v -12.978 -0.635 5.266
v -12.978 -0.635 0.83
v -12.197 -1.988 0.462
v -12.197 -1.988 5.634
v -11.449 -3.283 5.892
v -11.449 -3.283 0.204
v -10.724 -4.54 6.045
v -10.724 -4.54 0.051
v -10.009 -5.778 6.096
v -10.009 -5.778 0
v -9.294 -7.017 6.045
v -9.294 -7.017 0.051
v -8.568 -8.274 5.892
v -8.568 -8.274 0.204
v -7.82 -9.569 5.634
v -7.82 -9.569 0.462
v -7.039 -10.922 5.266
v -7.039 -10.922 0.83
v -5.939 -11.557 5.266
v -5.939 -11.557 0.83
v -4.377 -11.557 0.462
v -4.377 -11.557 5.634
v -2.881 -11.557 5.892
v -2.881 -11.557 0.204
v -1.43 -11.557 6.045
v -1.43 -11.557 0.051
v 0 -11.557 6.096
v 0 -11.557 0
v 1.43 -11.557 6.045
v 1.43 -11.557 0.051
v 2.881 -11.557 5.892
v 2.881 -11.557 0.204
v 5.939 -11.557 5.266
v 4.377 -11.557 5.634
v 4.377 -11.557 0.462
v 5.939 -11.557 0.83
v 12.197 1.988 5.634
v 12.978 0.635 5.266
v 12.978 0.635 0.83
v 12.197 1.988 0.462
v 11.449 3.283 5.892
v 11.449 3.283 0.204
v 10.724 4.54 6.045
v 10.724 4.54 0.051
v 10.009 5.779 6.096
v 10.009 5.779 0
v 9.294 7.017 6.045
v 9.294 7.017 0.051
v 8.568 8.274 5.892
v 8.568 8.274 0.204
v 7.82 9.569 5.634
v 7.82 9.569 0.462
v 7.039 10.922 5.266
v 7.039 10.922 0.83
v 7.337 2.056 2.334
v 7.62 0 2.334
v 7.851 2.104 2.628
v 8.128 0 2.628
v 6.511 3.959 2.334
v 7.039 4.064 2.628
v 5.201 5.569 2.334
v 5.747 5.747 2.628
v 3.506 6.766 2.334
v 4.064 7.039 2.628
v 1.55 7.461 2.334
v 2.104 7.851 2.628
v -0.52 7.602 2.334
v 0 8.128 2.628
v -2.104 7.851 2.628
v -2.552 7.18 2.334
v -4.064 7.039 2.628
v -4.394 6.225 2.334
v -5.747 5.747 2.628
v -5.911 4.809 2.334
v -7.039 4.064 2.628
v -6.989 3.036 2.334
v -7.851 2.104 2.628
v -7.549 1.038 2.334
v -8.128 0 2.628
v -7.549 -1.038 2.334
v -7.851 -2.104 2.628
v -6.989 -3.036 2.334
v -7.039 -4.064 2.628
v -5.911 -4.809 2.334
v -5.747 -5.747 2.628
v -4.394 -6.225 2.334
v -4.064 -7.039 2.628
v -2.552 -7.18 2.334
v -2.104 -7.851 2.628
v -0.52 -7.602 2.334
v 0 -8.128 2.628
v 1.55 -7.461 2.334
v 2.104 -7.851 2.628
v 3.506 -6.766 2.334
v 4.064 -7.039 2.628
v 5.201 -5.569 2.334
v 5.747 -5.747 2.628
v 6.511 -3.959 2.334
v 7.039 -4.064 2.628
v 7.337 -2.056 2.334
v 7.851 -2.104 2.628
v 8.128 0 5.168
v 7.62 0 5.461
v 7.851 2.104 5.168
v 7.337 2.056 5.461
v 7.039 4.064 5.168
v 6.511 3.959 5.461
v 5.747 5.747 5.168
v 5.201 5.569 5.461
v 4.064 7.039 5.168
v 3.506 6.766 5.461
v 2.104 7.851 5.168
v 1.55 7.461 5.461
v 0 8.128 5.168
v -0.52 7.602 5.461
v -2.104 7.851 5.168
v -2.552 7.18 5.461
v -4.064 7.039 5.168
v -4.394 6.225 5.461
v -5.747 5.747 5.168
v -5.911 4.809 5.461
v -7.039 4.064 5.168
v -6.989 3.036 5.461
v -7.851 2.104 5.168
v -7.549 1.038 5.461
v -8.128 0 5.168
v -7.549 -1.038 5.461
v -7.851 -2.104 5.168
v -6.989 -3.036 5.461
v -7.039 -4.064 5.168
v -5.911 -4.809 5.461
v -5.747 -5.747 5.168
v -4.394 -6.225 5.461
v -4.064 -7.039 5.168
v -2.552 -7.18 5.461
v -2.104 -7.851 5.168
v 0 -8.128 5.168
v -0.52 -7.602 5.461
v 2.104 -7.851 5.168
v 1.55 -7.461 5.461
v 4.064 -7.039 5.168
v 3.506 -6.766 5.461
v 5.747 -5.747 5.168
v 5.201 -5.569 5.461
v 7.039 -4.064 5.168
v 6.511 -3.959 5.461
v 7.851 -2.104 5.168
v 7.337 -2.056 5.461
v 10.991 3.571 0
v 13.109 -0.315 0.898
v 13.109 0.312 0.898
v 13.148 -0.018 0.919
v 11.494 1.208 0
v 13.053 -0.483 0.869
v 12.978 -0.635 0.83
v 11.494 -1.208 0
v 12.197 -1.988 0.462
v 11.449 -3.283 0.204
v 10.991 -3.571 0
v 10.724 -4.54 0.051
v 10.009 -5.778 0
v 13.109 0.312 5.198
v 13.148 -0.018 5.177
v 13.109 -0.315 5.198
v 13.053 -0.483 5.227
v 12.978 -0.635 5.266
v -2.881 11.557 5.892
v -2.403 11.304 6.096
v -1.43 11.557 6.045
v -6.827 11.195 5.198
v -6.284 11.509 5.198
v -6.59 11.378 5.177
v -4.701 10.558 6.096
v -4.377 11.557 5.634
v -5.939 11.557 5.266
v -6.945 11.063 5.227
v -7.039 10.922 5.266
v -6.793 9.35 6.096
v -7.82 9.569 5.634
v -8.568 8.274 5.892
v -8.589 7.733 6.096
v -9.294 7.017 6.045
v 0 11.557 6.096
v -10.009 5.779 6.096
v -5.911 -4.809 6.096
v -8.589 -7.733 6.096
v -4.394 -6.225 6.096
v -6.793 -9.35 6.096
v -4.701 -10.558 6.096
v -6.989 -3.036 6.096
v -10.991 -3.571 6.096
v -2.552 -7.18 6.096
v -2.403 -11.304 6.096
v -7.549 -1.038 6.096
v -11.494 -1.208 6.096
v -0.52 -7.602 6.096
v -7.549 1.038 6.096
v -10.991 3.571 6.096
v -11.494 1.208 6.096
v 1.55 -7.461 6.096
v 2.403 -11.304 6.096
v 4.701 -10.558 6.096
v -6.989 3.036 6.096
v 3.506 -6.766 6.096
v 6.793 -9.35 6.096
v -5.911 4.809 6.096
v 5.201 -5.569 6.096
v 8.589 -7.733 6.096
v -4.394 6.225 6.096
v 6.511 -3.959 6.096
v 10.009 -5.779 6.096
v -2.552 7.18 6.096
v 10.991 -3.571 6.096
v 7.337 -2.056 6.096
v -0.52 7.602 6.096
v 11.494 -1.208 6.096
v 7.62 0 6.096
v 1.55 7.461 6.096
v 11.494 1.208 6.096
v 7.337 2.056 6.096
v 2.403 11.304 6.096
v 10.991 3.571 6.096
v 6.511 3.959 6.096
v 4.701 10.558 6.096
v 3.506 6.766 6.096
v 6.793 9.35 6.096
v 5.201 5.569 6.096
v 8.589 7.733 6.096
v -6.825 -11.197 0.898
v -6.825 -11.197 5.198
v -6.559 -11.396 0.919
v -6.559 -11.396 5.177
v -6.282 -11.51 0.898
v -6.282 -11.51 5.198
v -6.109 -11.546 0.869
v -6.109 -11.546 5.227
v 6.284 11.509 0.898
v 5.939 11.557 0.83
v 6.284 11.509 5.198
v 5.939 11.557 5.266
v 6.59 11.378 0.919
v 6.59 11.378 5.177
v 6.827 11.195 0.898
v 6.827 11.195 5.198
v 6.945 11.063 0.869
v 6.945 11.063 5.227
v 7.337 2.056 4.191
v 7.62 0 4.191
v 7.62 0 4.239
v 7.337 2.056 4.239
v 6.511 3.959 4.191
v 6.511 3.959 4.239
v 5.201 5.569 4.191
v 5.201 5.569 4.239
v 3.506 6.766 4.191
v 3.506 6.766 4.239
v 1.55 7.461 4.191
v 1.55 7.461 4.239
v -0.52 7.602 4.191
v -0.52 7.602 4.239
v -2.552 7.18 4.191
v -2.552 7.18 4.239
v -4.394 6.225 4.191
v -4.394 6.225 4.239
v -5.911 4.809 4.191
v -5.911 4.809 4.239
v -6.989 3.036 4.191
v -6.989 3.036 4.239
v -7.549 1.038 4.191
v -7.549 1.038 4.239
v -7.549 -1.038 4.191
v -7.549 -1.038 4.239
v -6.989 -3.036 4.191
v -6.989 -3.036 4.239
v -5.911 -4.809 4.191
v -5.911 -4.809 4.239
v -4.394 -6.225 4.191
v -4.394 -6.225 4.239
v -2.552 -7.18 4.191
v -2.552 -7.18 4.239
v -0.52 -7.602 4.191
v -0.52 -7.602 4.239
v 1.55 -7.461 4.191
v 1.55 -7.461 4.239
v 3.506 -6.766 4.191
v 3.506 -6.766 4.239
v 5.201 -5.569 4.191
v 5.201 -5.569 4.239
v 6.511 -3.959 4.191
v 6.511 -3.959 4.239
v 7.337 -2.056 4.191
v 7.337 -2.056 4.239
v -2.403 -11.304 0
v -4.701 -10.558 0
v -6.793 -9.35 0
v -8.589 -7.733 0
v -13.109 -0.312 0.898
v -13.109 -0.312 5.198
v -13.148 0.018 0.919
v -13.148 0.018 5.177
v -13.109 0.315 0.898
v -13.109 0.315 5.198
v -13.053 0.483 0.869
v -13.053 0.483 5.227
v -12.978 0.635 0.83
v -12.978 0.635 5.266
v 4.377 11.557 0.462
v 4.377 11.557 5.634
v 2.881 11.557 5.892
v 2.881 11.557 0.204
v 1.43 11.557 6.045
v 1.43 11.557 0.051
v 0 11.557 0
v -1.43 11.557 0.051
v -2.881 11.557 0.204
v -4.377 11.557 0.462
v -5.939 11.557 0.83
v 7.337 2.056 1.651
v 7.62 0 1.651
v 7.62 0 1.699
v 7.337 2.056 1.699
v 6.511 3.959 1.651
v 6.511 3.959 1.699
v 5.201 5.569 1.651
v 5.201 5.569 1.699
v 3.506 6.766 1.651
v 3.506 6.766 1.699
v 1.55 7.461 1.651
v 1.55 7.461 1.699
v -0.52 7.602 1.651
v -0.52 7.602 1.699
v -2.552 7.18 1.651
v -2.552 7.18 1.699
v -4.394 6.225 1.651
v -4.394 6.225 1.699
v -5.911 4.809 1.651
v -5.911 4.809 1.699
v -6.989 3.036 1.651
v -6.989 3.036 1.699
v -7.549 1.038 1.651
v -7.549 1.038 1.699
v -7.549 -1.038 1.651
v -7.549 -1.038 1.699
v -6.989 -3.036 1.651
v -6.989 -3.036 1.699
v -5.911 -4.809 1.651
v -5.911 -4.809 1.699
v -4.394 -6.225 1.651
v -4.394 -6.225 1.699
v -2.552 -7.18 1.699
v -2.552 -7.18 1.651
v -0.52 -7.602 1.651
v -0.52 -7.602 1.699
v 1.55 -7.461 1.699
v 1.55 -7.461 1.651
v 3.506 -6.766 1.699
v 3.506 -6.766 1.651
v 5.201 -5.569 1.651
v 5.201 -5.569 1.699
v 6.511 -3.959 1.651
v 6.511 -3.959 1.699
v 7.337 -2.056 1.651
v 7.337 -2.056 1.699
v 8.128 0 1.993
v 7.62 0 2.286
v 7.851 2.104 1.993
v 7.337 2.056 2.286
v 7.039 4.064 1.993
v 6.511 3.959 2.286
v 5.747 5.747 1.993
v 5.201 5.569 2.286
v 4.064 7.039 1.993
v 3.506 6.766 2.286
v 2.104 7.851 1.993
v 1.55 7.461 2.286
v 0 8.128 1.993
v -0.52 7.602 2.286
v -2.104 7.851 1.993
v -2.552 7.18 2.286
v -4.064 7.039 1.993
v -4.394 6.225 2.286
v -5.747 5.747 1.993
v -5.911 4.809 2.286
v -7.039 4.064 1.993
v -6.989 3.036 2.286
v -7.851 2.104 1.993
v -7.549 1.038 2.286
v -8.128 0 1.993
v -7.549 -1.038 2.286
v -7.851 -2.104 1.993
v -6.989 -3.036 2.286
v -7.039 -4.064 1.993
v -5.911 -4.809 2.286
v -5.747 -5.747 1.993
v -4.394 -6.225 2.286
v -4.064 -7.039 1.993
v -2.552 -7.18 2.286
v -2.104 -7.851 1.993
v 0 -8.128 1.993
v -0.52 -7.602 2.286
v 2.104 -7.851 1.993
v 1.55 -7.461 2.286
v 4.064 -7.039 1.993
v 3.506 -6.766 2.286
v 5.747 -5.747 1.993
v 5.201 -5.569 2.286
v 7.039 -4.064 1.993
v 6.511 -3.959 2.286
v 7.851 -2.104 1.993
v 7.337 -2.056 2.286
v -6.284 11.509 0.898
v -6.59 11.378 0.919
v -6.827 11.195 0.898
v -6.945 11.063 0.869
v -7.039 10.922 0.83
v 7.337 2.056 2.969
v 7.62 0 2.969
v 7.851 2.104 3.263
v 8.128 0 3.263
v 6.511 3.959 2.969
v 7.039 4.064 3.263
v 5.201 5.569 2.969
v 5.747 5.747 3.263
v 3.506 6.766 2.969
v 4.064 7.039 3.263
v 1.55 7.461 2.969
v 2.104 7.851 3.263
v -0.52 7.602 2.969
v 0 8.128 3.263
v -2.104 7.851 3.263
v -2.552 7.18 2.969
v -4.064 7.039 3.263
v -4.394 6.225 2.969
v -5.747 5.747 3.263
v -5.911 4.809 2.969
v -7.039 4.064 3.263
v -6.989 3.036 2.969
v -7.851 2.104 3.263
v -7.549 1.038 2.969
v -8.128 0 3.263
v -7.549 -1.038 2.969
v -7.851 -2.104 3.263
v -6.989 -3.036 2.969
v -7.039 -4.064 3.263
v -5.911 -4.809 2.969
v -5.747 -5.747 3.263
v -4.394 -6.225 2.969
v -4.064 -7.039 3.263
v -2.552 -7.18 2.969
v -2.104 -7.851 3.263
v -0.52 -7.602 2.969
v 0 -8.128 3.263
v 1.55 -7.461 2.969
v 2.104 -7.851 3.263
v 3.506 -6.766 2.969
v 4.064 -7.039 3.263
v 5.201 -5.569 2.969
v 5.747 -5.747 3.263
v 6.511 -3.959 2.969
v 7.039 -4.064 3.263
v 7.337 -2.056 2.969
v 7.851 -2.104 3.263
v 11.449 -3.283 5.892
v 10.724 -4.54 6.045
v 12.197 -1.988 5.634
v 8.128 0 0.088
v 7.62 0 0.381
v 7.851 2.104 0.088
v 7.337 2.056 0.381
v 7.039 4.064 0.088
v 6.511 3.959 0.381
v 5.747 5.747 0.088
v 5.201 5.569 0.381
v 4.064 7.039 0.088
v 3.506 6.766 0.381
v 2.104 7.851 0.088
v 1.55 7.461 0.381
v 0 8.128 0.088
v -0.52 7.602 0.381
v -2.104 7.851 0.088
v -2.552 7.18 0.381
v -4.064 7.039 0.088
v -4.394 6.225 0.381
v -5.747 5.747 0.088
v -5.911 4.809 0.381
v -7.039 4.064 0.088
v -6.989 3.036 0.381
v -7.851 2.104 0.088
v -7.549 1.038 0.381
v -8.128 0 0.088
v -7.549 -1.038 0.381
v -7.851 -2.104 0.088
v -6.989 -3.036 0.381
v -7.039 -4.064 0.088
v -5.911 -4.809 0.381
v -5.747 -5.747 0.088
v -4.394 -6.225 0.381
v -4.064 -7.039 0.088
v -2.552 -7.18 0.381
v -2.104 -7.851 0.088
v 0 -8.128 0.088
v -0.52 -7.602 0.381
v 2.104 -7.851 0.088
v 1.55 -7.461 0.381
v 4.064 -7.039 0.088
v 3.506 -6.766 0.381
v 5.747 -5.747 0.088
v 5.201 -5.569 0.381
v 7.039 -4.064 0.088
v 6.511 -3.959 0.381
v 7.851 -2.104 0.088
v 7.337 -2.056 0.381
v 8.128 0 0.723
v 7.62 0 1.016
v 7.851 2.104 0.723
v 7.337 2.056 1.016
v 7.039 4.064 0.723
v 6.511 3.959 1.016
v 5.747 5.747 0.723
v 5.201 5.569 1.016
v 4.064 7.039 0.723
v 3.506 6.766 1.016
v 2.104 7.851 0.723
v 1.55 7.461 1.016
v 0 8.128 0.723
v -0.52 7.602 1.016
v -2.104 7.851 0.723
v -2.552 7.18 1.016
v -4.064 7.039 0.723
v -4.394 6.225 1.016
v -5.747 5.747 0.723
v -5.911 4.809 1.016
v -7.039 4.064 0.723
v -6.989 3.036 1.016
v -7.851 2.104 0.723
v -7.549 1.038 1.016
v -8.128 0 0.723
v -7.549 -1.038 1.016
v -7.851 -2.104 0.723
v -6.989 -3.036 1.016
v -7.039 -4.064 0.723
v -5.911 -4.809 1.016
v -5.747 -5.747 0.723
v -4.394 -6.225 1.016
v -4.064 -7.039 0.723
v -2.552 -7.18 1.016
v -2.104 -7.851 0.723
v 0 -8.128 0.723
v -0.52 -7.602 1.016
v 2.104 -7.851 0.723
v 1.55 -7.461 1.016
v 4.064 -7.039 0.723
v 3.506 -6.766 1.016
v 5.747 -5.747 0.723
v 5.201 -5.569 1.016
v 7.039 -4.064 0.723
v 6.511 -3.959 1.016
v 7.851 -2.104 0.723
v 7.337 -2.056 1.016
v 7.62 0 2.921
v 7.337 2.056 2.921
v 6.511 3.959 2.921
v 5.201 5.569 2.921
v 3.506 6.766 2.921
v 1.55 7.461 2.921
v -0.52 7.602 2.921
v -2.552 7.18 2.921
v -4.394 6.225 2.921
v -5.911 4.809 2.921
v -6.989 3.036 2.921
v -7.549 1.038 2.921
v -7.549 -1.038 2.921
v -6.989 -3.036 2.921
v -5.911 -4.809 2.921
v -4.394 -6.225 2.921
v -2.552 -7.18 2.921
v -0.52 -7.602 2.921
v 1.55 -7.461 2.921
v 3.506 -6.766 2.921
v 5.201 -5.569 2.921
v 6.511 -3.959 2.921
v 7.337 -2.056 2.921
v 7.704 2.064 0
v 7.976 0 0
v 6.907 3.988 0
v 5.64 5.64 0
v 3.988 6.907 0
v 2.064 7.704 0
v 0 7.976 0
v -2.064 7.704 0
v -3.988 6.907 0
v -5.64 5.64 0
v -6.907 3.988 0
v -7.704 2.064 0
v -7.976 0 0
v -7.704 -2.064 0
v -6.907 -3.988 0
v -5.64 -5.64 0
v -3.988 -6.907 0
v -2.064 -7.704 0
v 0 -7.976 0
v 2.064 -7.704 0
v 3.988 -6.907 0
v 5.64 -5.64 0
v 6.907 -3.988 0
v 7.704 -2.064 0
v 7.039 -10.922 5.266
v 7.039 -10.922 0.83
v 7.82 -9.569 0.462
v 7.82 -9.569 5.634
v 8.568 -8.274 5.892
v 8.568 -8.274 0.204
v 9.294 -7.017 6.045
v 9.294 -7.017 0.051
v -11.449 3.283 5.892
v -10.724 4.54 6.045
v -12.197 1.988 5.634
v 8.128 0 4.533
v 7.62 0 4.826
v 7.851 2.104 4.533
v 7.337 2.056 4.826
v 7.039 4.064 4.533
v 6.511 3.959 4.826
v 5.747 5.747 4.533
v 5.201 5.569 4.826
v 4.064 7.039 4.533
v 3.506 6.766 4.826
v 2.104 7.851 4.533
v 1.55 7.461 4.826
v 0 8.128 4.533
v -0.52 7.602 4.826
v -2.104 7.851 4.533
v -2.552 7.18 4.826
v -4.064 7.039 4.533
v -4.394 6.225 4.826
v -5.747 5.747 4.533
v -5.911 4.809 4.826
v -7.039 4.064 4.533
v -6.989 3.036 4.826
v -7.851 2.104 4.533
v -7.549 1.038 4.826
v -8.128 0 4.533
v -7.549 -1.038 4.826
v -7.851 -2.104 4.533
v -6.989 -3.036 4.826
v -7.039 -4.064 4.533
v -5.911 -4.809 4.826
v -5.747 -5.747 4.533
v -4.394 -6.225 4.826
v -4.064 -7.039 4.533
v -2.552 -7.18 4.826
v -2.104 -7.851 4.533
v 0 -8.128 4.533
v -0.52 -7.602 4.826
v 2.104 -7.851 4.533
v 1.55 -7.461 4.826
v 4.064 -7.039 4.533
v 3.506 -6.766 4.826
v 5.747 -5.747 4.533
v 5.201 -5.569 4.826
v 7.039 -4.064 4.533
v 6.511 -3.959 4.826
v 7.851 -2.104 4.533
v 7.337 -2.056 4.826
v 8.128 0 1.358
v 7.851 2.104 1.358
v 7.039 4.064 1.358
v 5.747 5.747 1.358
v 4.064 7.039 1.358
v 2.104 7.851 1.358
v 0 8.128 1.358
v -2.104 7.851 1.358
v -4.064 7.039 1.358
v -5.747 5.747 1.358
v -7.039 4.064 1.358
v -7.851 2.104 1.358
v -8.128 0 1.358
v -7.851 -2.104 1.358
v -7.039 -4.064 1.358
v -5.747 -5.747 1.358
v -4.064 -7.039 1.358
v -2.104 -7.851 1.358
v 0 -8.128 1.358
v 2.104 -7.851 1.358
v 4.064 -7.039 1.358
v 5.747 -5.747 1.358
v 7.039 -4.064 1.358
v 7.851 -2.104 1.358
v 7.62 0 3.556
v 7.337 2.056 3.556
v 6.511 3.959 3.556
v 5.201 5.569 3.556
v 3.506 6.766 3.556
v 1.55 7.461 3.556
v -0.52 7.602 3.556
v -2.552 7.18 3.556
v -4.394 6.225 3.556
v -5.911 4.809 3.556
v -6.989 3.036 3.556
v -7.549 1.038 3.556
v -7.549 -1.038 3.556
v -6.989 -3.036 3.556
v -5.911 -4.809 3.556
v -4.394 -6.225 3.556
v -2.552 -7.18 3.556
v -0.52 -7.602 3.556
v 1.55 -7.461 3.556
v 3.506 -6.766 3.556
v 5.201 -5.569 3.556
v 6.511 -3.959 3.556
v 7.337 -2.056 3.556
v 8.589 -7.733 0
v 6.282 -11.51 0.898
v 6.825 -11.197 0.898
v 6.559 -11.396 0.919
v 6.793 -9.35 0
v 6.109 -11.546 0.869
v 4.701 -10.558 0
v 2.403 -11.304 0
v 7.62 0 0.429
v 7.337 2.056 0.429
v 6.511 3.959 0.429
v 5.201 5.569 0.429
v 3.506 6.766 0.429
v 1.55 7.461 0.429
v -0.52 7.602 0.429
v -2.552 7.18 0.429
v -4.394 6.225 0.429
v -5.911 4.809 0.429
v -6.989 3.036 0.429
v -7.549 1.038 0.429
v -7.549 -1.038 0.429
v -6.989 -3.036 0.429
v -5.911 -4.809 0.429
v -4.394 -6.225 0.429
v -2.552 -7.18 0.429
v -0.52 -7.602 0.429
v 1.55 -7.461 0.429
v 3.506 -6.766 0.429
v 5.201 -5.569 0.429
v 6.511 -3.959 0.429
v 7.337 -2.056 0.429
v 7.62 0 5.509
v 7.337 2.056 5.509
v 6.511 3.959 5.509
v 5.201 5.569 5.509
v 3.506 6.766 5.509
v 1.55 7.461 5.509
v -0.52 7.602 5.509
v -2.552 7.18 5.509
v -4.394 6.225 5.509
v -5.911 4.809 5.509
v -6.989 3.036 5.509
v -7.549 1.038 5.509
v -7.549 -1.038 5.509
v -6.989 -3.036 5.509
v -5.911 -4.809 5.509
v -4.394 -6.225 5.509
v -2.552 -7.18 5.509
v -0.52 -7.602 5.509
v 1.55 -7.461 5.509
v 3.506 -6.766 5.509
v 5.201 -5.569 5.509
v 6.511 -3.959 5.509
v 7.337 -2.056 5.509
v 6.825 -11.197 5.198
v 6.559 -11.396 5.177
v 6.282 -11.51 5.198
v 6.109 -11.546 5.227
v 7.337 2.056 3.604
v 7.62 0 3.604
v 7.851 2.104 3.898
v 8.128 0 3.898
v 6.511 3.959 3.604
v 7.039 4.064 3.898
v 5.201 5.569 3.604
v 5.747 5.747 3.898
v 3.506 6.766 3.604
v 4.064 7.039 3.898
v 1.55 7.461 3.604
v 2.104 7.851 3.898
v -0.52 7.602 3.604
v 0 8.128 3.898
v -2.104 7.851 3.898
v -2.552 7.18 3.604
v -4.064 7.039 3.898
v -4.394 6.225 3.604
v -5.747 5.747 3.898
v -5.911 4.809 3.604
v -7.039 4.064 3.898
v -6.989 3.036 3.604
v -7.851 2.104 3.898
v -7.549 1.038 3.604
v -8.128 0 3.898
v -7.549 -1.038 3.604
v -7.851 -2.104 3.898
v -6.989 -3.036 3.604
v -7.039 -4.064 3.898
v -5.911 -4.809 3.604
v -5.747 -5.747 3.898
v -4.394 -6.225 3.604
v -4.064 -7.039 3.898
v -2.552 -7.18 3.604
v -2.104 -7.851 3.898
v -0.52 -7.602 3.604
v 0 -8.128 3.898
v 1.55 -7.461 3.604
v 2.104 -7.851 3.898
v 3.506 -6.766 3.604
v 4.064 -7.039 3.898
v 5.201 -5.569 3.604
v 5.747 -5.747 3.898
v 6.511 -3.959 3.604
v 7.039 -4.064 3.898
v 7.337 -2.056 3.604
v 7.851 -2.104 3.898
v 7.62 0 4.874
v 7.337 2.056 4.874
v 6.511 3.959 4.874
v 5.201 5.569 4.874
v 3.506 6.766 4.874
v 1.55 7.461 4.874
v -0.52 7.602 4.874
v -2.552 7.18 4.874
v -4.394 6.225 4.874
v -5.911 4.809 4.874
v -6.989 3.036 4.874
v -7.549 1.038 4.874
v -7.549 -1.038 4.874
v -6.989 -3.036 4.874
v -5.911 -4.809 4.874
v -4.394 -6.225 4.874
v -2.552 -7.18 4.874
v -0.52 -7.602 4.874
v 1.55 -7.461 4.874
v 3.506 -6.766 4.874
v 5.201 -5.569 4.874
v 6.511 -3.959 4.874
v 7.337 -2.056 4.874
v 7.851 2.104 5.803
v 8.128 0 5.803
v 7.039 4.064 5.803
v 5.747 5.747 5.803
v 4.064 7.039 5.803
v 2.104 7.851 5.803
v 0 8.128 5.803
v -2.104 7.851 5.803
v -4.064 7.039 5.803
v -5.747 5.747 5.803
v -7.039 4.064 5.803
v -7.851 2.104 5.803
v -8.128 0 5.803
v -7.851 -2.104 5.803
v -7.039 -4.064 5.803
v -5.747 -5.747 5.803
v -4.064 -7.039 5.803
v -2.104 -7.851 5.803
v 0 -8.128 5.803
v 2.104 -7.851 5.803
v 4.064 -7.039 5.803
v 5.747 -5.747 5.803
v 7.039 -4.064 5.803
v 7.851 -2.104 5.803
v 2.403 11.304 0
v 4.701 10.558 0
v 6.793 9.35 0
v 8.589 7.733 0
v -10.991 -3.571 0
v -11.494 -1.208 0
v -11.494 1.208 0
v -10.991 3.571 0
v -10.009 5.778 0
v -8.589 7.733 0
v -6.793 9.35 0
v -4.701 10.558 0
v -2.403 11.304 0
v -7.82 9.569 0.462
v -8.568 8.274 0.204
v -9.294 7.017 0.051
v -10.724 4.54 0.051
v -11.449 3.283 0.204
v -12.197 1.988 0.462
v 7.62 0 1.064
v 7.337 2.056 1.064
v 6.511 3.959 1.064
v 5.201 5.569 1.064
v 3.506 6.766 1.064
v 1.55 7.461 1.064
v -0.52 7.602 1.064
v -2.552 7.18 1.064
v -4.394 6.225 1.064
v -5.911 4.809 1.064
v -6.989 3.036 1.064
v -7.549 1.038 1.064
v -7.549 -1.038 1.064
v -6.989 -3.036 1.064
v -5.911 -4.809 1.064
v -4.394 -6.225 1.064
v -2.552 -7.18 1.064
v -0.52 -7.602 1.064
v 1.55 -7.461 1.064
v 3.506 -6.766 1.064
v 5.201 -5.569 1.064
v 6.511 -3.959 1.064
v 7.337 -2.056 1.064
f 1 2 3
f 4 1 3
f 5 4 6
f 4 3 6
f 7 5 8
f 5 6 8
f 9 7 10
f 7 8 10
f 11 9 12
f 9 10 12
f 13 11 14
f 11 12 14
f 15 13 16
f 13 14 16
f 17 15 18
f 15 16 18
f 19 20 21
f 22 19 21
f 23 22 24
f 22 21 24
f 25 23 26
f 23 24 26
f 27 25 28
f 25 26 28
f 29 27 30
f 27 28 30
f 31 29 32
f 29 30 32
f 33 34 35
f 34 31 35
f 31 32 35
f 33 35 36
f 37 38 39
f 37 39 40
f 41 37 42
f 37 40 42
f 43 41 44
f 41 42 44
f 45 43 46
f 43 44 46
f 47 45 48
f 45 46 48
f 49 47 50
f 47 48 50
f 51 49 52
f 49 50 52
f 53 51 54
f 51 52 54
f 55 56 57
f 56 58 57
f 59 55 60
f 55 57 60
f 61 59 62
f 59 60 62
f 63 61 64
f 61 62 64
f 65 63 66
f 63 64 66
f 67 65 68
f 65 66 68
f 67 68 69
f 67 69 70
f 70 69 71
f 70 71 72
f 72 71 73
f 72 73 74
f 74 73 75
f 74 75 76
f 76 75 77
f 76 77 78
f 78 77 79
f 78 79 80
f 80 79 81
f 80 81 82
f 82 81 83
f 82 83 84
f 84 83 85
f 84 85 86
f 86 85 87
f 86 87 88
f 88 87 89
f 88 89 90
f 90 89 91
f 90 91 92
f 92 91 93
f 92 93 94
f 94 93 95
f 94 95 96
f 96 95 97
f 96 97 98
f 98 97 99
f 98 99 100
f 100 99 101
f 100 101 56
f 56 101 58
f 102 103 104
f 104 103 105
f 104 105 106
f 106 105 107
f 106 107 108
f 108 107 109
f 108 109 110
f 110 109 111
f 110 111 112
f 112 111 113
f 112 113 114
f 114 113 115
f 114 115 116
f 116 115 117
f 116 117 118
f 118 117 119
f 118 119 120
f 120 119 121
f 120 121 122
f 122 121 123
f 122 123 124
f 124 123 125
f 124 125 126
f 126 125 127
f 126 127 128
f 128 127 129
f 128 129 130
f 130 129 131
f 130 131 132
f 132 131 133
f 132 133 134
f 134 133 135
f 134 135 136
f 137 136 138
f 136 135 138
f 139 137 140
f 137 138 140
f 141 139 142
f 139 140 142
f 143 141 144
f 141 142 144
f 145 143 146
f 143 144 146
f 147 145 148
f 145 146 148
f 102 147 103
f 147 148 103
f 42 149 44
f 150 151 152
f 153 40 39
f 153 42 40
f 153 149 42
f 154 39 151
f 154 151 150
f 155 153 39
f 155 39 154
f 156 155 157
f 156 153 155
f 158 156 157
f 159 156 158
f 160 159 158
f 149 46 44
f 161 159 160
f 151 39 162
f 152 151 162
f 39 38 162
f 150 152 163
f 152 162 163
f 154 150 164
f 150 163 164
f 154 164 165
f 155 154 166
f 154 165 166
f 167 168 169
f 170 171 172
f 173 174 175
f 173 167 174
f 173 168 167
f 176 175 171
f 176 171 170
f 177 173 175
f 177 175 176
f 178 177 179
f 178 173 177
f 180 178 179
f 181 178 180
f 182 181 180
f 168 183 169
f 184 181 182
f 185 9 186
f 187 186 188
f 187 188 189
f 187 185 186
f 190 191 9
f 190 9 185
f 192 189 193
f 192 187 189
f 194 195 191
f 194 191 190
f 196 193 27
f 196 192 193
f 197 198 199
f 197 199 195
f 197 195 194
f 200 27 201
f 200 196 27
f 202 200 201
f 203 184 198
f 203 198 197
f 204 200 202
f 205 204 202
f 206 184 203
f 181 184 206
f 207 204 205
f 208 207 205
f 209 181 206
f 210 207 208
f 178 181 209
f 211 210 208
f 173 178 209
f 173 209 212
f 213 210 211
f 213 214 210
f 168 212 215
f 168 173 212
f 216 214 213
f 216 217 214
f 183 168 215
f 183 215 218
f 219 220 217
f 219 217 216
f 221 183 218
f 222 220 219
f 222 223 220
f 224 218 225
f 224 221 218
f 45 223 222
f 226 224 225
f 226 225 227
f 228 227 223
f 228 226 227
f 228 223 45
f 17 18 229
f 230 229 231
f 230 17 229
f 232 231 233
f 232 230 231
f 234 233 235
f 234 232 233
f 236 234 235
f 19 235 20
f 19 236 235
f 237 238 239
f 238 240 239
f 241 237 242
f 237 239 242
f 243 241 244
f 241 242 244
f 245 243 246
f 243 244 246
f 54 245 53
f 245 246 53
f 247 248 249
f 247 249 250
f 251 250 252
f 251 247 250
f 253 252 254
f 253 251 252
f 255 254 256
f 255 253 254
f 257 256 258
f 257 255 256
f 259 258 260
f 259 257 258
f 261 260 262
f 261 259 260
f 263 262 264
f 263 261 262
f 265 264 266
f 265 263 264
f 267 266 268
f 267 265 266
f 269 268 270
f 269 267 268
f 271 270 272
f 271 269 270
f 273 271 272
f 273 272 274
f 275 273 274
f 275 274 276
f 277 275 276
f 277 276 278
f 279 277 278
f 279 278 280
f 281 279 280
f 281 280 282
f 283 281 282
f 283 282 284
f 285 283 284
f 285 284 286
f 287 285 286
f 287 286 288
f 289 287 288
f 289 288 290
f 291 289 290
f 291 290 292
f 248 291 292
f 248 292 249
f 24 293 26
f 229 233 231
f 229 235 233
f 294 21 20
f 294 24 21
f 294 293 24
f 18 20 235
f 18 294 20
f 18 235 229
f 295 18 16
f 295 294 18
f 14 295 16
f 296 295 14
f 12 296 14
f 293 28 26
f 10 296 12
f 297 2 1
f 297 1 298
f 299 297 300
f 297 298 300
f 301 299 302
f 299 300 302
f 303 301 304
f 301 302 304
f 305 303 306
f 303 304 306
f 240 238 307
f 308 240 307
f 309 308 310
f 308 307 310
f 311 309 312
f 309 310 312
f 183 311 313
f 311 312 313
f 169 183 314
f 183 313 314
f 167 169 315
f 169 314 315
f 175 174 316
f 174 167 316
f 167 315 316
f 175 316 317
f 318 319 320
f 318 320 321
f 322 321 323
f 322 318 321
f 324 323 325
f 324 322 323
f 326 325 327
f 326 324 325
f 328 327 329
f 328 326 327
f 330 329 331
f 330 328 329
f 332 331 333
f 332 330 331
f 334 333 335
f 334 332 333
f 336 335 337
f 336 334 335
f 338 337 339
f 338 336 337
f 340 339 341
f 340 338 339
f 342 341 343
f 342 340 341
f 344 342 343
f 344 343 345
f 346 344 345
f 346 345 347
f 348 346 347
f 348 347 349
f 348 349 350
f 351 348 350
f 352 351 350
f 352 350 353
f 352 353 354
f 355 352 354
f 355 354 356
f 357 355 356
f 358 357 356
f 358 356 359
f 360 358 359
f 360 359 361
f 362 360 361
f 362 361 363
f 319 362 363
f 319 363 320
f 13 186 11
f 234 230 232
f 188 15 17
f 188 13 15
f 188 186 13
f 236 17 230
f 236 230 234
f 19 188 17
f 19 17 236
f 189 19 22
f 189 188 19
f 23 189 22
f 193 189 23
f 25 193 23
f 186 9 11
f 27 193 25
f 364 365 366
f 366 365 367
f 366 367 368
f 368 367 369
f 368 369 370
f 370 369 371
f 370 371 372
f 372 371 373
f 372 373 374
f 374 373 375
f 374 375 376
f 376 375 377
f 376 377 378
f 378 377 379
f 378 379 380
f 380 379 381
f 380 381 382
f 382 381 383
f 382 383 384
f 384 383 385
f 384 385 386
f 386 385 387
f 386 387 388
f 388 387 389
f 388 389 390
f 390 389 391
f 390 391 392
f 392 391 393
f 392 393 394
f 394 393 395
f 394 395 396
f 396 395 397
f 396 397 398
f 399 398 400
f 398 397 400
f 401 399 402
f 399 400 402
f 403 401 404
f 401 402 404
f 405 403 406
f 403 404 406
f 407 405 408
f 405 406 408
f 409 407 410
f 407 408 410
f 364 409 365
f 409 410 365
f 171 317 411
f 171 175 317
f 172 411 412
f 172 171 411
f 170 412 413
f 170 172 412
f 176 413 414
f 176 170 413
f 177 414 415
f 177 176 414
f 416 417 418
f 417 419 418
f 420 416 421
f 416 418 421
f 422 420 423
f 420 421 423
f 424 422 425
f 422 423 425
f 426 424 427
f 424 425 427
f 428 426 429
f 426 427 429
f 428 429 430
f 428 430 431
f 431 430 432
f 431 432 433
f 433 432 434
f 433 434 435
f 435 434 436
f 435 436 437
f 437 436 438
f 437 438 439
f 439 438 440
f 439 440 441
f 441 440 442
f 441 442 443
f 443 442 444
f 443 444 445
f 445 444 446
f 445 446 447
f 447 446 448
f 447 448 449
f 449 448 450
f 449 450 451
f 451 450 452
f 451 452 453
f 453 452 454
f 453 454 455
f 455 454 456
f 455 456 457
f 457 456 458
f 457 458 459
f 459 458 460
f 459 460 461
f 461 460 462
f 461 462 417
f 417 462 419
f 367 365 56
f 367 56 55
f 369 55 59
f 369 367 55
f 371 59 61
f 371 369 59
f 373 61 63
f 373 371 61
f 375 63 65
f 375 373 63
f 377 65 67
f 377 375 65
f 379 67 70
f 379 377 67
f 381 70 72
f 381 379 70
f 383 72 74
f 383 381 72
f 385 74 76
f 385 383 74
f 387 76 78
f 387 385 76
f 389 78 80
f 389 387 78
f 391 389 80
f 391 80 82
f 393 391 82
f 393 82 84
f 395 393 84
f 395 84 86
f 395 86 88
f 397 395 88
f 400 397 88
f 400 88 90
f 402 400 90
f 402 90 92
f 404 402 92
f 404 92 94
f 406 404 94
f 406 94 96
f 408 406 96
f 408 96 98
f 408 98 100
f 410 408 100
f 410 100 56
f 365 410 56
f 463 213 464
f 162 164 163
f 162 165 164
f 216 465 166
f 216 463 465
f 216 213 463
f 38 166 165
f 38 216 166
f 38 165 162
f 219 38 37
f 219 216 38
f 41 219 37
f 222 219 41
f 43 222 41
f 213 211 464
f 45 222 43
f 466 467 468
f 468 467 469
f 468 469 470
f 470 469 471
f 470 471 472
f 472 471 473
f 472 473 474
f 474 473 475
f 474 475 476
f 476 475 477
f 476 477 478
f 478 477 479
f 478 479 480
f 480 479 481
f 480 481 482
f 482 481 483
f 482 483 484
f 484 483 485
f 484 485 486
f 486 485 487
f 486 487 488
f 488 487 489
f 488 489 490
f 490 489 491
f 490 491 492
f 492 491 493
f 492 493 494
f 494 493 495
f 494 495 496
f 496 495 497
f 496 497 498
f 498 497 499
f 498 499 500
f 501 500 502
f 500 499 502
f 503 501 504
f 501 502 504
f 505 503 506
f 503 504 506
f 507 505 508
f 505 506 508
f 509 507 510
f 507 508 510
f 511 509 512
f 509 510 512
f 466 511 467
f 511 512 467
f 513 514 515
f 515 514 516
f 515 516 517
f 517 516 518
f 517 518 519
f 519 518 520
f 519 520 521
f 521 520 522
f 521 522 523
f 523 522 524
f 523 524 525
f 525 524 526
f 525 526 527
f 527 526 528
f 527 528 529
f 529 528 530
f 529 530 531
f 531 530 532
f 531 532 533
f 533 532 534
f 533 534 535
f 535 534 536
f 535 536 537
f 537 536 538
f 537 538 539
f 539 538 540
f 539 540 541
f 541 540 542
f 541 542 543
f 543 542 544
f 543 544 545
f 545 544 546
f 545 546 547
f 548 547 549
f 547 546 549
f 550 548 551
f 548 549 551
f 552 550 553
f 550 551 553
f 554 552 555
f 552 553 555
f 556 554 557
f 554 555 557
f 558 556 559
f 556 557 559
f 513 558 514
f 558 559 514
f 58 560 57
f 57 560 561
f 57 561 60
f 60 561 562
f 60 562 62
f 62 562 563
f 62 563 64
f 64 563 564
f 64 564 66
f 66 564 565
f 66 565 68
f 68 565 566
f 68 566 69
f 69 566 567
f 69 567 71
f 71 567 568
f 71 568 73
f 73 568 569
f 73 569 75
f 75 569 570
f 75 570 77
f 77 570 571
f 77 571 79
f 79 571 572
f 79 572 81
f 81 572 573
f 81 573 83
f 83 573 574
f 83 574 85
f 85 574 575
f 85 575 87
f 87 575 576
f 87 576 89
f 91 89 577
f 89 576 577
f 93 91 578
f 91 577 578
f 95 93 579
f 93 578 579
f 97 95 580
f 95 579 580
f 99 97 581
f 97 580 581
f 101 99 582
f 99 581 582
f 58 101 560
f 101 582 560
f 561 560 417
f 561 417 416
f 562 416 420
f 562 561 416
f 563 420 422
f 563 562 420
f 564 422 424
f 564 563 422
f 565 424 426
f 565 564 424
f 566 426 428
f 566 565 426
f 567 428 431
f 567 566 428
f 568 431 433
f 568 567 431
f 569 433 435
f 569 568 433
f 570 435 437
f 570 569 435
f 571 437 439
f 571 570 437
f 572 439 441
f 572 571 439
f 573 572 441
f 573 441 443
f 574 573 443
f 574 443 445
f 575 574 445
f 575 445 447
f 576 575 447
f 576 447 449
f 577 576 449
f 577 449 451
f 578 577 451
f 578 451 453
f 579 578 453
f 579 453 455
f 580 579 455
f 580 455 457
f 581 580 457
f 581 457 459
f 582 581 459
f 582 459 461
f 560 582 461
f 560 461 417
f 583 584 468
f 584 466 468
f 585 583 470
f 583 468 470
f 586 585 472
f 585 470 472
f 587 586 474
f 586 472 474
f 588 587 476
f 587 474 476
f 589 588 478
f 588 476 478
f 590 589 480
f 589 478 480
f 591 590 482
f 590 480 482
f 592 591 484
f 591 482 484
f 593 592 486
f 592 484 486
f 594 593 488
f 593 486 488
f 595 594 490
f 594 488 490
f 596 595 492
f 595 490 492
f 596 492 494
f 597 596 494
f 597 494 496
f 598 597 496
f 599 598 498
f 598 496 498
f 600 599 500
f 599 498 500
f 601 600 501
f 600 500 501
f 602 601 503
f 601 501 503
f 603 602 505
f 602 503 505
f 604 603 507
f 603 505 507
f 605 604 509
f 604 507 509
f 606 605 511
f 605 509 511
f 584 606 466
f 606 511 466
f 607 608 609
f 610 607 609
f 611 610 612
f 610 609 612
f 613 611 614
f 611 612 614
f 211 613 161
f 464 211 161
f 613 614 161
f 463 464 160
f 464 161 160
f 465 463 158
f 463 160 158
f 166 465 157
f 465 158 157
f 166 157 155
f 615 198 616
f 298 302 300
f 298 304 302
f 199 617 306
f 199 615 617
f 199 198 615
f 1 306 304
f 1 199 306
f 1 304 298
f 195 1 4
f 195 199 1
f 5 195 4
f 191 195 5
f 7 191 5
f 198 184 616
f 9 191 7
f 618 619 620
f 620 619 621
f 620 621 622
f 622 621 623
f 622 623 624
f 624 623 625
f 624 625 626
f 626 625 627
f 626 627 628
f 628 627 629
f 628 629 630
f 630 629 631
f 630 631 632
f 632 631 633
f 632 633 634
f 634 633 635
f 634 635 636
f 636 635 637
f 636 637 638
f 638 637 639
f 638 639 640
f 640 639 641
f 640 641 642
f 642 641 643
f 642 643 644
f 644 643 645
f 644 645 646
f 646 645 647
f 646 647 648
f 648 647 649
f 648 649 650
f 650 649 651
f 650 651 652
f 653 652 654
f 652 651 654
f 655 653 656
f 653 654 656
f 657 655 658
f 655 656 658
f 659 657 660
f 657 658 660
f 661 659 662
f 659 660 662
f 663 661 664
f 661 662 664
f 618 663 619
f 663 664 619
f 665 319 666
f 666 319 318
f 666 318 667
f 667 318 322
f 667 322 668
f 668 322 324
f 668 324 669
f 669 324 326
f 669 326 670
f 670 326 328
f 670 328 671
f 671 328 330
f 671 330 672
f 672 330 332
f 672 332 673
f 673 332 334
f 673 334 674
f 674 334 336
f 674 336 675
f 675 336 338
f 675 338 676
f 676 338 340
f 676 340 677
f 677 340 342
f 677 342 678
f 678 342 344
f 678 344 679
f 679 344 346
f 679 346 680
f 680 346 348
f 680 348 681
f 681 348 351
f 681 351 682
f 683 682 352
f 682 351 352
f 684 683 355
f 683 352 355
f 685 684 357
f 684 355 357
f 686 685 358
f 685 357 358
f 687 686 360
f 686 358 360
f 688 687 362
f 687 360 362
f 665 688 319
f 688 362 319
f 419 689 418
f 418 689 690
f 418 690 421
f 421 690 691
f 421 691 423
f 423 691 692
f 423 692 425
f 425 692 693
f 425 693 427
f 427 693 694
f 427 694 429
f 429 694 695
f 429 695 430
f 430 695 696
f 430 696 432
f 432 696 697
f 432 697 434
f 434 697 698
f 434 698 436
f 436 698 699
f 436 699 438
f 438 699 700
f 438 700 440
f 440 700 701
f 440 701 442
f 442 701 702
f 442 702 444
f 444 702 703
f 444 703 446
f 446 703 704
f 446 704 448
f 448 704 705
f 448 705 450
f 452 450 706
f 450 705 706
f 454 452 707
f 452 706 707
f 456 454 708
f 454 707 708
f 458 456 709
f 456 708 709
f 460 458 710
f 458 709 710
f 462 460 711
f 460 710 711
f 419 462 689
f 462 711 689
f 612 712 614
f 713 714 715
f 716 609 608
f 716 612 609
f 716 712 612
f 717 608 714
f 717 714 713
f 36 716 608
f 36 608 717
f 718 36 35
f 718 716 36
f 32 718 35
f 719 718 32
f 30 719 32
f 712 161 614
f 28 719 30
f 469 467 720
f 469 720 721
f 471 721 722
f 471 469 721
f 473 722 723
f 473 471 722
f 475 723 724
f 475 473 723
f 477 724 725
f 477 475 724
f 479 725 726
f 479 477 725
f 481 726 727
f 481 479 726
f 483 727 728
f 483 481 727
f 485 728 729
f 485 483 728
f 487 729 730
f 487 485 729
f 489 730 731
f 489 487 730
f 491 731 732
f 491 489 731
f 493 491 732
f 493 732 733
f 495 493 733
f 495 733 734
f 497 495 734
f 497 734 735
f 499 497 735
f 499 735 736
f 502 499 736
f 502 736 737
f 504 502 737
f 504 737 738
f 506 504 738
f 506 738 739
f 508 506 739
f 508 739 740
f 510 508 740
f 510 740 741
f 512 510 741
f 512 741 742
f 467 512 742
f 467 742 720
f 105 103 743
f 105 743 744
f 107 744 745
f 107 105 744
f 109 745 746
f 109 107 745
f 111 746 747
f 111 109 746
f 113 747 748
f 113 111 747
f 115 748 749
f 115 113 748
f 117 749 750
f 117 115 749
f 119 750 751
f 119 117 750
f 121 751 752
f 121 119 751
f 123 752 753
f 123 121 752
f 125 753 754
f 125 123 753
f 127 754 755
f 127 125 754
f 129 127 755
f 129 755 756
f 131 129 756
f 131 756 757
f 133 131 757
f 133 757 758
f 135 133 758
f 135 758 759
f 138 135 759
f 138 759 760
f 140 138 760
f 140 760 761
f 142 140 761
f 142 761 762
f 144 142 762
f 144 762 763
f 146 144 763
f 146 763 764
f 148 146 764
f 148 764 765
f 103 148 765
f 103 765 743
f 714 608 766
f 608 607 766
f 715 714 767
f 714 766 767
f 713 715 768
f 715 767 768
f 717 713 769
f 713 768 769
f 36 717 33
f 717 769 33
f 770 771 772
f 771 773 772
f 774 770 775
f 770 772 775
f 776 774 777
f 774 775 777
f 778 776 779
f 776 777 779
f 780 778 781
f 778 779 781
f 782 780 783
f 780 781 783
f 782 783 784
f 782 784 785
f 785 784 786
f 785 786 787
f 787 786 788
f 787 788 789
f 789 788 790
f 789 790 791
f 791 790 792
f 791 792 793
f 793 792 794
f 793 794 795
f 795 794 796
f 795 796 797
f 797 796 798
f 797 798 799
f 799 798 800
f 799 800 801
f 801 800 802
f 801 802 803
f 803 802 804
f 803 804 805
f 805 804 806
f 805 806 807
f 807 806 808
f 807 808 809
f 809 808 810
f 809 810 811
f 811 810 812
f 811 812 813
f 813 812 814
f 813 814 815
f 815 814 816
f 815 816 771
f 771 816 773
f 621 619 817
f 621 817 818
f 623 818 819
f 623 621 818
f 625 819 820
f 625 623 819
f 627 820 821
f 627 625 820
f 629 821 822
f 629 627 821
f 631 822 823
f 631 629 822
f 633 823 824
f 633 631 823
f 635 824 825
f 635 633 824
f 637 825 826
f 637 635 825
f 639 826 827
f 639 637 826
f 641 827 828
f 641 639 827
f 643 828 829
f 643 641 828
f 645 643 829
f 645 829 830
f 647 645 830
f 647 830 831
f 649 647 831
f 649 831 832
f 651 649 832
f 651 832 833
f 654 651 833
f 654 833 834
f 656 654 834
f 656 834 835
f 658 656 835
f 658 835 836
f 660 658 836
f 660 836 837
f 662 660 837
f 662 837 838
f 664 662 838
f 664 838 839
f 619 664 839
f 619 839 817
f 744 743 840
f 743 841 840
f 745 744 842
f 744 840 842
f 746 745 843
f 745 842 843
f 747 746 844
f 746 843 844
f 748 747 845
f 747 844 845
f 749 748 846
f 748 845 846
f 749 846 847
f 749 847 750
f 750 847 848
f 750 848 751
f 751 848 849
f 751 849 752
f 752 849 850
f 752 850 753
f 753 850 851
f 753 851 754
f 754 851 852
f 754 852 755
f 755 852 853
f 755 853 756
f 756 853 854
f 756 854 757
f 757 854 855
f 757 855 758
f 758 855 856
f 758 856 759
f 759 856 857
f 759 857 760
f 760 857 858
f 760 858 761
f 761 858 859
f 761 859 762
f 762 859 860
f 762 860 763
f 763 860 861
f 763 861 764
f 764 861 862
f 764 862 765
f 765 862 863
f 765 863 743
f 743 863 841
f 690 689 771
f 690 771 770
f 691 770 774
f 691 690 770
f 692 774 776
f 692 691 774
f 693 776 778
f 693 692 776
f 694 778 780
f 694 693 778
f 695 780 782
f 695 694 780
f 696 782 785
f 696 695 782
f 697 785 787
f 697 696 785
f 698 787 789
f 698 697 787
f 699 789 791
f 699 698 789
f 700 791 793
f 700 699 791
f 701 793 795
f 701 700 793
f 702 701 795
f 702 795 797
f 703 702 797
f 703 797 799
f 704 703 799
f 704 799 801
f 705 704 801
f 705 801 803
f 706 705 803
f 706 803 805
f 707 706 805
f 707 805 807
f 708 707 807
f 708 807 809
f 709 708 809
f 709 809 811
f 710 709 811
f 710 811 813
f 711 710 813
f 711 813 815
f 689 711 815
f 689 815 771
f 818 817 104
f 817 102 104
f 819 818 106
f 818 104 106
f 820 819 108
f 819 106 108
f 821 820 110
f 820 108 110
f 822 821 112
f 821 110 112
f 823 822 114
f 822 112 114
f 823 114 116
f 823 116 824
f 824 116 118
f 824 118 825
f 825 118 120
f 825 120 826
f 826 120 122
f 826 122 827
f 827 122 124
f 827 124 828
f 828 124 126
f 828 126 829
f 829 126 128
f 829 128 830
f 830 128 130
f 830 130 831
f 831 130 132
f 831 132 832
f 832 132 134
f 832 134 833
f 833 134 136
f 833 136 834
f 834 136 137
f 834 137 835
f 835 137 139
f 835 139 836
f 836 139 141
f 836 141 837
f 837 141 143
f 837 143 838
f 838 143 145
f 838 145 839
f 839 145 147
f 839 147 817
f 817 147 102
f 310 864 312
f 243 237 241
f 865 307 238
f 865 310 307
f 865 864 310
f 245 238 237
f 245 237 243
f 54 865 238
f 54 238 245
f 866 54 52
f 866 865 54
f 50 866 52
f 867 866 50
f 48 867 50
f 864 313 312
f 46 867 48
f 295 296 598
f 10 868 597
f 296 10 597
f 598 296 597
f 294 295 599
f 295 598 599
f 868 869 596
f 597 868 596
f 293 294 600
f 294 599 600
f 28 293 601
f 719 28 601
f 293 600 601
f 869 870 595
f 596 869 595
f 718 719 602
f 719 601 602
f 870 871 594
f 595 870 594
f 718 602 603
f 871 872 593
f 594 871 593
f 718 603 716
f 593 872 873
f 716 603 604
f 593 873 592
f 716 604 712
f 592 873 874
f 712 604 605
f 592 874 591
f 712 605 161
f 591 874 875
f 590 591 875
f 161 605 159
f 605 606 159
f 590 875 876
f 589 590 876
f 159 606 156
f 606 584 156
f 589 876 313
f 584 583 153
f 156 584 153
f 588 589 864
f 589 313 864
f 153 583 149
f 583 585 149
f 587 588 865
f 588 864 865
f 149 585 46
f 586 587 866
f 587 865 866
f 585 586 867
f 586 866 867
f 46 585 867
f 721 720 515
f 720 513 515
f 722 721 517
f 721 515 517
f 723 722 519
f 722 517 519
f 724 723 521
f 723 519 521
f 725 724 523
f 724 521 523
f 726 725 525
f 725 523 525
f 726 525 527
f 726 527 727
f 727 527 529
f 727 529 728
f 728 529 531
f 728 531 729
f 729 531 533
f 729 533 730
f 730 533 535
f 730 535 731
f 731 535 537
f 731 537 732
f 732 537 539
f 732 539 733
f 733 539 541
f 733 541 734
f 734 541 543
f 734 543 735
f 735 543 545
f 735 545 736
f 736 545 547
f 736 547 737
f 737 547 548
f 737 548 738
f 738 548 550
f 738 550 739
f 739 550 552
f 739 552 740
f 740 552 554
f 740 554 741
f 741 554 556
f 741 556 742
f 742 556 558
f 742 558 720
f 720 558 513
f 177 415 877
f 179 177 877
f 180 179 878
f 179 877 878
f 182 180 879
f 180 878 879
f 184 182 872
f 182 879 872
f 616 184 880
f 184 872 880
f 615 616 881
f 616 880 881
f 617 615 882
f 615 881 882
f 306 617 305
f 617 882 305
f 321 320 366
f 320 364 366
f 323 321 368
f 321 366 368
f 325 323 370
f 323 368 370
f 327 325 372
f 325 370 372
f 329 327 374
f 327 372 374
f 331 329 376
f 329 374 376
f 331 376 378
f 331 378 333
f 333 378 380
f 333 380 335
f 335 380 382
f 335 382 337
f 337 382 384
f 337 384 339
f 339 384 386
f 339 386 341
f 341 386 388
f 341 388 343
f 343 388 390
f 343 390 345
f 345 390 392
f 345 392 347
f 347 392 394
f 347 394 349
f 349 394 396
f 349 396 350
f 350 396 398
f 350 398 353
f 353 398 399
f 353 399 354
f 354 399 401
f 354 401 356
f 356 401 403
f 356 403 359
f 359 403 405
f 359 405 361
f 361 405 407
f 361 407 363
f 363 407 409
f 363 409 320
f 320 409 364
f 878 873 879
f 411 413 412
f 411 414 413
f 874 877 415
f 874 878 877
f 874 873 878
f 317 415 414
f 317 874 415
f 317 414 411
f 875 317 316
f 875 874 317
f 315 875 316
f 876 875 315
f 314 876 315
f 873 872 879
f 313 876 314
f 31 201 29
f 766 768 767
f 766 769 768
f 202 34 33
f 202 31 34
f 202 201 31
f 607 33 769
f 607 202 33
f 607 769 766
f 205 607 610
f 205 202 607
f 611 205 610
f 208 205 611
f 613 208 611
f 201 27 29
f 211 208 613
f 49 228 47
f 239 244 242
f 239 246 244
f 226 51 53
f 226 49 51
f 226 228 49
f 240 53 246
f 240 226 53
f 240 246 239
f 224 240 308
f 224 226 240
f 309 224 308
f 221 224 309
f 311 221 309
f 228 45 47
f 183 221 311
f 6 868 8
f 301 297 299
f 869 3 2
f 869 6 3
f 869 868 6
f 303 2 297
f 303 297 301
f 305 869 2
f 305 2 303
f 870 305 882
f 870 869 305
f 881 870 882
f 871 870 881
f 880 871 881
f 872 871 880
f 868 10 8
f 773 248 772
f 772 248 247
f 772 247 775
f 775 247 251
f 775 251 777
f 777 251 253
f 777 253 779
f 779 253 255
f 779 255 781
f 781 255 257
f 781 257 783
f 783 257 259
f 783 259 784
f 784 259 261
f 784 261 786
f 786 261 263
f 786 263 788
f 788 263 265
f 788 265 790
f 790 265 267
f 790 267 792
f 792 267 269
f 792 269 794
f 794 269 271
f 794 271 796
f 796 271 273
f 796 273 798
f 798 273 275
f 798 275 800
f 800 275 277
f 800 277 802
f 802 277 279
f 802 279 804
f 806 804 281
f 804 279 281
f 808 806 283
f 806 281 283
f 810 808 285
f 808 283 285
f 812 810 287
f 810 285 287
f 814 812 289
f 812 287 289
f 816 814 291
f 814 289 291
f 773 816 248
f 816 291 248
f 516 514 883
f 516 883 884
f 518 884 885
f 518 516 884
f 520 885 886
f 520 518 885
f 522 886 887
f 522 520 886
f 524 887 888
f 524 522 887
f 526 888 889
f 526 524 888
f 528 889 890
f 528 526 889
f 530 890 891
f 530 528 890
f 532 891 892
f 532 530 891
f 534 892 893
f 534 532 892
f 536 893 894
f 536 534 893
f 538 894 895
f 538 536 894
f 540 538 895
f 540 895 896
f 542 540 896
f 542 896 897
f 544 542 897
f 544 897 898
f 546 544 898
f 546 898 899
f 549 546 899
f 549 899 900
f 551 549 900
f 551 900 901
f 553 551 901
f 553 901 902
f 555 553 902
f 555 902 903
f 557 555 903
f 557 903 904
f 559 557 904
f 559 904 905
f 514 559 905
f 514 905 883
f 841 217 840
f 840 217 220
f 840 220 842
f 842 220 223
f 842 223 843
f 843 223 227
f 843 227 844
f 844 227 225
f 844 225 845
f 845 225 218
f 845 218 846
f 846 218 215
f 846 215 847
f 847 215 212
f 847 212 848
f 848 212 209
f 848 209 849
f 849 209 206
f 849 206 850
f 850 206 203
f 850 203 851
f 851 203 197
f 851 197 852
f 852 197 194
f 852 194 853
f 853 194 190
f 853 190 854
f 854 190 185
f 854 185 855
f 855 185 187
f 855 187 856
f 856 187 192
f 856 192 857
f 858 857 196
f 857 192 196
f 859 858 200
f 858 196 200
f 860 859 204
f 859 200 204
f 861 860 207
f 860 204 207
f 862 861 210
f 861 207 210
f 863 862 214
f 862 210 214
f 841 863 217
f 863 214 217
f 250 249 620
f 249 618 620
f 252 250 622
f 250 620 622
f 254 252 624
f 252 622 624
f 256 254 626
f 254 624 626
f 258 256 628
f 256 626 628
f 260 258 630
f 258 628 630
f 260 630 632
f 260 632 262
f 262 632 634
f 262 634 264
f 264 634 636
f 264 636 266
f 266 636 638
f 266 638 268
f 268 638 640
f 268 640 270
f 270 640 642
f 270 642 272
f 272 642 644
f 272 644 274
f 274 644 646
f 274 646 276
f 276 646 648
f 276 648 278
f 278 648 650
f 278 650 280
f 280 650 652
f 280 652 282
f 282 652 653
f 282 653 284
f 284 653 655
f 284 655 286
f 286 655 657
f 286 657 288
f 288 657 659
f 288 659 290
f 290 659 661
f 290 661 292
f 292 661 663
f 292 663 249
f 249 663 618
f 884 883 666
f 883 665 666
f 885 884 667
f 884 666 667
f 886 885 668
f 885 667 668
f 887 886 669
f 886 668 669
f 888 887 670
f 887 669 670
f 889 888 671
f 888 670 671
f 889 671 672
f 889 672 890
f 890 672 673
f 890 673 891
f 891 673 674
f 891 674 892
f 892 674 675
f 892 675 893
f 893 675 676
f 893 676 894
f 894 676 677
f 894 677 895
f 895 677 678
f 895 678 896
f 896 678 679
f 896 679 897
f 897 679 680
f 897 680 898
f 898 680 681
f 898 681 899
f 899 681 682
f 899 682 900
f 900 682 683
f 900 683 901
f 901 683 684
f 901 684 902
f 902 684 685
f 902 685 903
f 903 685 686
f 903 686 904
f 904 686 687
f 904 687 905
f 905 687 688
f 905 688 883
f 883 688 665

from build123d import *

# Parameters (mm, degrees)
SKETCH1_R          = 7.62
EXTRUDE1_DEPTH     = 6.096
SKETCH2_OUTSIDE_W  = 60.438
SKETCH2_OUTSIDE_H  = 56.862
SKETCH2_OUTSIDE_R  = 11.557
CUT_EXTRUDE1_DEPTH = 7.096
CUT_EXTRUDE1_DRAFT = -60
SKETCH3_OUTSIDE_W  = 60.438
SKETCH3_OUTSIDE_H  = 56.862
SKETCH3_OUTSIDE_R  = 11.557
CUT_EXTRUDE2_DEPTH = 7.096
CUT_EXTRUDE2_DRAFT = -60
FILLET1_R          = 1.27
LPATTERN1_COUNT    = 10
LPATTERN1_PITCH    = 0.635


with BuildPart() as part:
    # Sketch1 → Extrude1 (new body)
    with BuildSketch(Plane.XY):
        Polygon((-13.344874122, 0), (-6.672437061, -11.557), (6.672437061, -11.557), (13.344874122, 0), (6.672437061, 11.557), (-6.672437061, 11.557), align=None)
        Circle(SKETCH1_R, mode=Mode.SUBTRACT)
    extrude(amount=EXTRUDE1_DEPTH)


with BuildPart() as cut_extrude1_tool:
    # Sketch2 outside → Cut-Extrude1 (with draft: the straight prism first)
    with BuildSketch(Plane.XY.offset(6.096)):
        Rectangle(SKETCH2_OUTSIDE_W, SKETCH2_OUTSIDE_H)
        Circle(SKETCH2_OUTSIDE_R, mode=Mode.SUBTRACT)
    extrude(amount=-CUT_EXTRUDE1_DEPTH)
    # Cut-Extrude1: the draft: its side faces are tilted about the plane it starts from
    cut_extrude1_sides = [cut_extrude1_tool.faces().sort_by_distance(p)[0] for p in [
        (0, -28.431, 2.548),
        (30.219, 0, 2.548),
        (0, 28.431, 2.548),
        (-30.219, 0, 2.548),
        (-11.557, 0, 2.548),
    ]]
    draft(cut_extrude1_sides, Plane.XY.offset(6.096), CUT_EXTRUDE1_DRAFT)


with BuildPart() as part_1:
    add(part.part)

    # Cut-Extrude1: cut by cut_extrude1_tool
    add(cut_extrude1_tool.part, mode=Mode.SUBTRACT)


with BuildPart() as cut_extrude2_tool:
    # Sketch3 outside → Cut-Extrude2 (with draft: the straight prism first)
    with BuildSketch(Plane(origin=(0, 0, 0), x_dir=(-1, 0, 0), z_dir=(0, 0, -1))):
        Rectangle(SKETCH3_OUTSIDE_W, SKETCH3_OUTSIDE_H)
        Circle(SKETCH3_OUTSIDE_R, mode=Mode.SUBTRACT)
    extrude(amount=-CUT_EXTRUDE2_DEPTH)
    # Cut-Extrude2: the draft: its side faces are tilted about the plane it starts from
    cut_extrude2_sides = [cut_extrude2_tool.faces().sort_by_distance(p)[0] for p in [
        (0, -28.431, 3.548),
        (-30.219, 0, 3.548),
        (0, 28.431, 3.548),
        (30.219, 0, 3.548),
        (11.557, 0, 3.548),
    ]]
    draft(cut_extrude2_sides, Plane(origin=(0, 0, 0), x_dir=(-1, 0, 0), z_dir=(0, 0, -1)), CUT_EXTRUDE2_DRAFT)


with BuildPart() as part_2:
    add(part_1.part)

    # Cut-Extrude2: cut by cut_extrude2_tool
    add(cut_extrude2_tool.part, mode=Mode.SUBTRACT)

    # Fillet1
    fillet1_edges = [part_2.edges().sort_by_distance(p)[0] for p in [
        (13.344874122, 0, 3.048),
        (6.672437061, -11.557, 3.048),
        (-6.672437061, -11.557, 3.048),
        (-13.344874122, 0, 3.048),
        (-6.672437061, 11.557, 3.048),
        (6.672437061, 11.557, 3.048),
    ]]
    fillet(fillet1_edges, radius=FILLET1_R)

    # Sketch4 → Cut-Revolve1 (revolve, cut)
    with BuildSketch(Plane(origin=(0, 0, 0), x_dir=(1, 0, 0), z_dir=(0, 1, 0)), mode=Mode.PRIVATE) as cut_revolve1_sk:
        Polygon((-7.62, -6.096), (-7.62, -5.509412127), (-8.128, -5.802706063), align=None)
    cut_revolve1 = revolve(cut_revolve1_sk.sketch.rotate(Axis((0, 0, 0), (0, 0, 1)), 180), axis=Axis((0, 0, 0), (0, 0, 1)), mode=Mode.SUBTRACT)  # turned: the seam where the file's is

    # LPattern1: Cut-Revolve1 ×10
    with Locations(*[(0, 0, -i * LPATTERN1_PITCH) for i in range(1, LPATTERN1_COUNT)]):
        add(cut_revolve1, mode=Mode.SUBTRACT)


solid = part_2.part
